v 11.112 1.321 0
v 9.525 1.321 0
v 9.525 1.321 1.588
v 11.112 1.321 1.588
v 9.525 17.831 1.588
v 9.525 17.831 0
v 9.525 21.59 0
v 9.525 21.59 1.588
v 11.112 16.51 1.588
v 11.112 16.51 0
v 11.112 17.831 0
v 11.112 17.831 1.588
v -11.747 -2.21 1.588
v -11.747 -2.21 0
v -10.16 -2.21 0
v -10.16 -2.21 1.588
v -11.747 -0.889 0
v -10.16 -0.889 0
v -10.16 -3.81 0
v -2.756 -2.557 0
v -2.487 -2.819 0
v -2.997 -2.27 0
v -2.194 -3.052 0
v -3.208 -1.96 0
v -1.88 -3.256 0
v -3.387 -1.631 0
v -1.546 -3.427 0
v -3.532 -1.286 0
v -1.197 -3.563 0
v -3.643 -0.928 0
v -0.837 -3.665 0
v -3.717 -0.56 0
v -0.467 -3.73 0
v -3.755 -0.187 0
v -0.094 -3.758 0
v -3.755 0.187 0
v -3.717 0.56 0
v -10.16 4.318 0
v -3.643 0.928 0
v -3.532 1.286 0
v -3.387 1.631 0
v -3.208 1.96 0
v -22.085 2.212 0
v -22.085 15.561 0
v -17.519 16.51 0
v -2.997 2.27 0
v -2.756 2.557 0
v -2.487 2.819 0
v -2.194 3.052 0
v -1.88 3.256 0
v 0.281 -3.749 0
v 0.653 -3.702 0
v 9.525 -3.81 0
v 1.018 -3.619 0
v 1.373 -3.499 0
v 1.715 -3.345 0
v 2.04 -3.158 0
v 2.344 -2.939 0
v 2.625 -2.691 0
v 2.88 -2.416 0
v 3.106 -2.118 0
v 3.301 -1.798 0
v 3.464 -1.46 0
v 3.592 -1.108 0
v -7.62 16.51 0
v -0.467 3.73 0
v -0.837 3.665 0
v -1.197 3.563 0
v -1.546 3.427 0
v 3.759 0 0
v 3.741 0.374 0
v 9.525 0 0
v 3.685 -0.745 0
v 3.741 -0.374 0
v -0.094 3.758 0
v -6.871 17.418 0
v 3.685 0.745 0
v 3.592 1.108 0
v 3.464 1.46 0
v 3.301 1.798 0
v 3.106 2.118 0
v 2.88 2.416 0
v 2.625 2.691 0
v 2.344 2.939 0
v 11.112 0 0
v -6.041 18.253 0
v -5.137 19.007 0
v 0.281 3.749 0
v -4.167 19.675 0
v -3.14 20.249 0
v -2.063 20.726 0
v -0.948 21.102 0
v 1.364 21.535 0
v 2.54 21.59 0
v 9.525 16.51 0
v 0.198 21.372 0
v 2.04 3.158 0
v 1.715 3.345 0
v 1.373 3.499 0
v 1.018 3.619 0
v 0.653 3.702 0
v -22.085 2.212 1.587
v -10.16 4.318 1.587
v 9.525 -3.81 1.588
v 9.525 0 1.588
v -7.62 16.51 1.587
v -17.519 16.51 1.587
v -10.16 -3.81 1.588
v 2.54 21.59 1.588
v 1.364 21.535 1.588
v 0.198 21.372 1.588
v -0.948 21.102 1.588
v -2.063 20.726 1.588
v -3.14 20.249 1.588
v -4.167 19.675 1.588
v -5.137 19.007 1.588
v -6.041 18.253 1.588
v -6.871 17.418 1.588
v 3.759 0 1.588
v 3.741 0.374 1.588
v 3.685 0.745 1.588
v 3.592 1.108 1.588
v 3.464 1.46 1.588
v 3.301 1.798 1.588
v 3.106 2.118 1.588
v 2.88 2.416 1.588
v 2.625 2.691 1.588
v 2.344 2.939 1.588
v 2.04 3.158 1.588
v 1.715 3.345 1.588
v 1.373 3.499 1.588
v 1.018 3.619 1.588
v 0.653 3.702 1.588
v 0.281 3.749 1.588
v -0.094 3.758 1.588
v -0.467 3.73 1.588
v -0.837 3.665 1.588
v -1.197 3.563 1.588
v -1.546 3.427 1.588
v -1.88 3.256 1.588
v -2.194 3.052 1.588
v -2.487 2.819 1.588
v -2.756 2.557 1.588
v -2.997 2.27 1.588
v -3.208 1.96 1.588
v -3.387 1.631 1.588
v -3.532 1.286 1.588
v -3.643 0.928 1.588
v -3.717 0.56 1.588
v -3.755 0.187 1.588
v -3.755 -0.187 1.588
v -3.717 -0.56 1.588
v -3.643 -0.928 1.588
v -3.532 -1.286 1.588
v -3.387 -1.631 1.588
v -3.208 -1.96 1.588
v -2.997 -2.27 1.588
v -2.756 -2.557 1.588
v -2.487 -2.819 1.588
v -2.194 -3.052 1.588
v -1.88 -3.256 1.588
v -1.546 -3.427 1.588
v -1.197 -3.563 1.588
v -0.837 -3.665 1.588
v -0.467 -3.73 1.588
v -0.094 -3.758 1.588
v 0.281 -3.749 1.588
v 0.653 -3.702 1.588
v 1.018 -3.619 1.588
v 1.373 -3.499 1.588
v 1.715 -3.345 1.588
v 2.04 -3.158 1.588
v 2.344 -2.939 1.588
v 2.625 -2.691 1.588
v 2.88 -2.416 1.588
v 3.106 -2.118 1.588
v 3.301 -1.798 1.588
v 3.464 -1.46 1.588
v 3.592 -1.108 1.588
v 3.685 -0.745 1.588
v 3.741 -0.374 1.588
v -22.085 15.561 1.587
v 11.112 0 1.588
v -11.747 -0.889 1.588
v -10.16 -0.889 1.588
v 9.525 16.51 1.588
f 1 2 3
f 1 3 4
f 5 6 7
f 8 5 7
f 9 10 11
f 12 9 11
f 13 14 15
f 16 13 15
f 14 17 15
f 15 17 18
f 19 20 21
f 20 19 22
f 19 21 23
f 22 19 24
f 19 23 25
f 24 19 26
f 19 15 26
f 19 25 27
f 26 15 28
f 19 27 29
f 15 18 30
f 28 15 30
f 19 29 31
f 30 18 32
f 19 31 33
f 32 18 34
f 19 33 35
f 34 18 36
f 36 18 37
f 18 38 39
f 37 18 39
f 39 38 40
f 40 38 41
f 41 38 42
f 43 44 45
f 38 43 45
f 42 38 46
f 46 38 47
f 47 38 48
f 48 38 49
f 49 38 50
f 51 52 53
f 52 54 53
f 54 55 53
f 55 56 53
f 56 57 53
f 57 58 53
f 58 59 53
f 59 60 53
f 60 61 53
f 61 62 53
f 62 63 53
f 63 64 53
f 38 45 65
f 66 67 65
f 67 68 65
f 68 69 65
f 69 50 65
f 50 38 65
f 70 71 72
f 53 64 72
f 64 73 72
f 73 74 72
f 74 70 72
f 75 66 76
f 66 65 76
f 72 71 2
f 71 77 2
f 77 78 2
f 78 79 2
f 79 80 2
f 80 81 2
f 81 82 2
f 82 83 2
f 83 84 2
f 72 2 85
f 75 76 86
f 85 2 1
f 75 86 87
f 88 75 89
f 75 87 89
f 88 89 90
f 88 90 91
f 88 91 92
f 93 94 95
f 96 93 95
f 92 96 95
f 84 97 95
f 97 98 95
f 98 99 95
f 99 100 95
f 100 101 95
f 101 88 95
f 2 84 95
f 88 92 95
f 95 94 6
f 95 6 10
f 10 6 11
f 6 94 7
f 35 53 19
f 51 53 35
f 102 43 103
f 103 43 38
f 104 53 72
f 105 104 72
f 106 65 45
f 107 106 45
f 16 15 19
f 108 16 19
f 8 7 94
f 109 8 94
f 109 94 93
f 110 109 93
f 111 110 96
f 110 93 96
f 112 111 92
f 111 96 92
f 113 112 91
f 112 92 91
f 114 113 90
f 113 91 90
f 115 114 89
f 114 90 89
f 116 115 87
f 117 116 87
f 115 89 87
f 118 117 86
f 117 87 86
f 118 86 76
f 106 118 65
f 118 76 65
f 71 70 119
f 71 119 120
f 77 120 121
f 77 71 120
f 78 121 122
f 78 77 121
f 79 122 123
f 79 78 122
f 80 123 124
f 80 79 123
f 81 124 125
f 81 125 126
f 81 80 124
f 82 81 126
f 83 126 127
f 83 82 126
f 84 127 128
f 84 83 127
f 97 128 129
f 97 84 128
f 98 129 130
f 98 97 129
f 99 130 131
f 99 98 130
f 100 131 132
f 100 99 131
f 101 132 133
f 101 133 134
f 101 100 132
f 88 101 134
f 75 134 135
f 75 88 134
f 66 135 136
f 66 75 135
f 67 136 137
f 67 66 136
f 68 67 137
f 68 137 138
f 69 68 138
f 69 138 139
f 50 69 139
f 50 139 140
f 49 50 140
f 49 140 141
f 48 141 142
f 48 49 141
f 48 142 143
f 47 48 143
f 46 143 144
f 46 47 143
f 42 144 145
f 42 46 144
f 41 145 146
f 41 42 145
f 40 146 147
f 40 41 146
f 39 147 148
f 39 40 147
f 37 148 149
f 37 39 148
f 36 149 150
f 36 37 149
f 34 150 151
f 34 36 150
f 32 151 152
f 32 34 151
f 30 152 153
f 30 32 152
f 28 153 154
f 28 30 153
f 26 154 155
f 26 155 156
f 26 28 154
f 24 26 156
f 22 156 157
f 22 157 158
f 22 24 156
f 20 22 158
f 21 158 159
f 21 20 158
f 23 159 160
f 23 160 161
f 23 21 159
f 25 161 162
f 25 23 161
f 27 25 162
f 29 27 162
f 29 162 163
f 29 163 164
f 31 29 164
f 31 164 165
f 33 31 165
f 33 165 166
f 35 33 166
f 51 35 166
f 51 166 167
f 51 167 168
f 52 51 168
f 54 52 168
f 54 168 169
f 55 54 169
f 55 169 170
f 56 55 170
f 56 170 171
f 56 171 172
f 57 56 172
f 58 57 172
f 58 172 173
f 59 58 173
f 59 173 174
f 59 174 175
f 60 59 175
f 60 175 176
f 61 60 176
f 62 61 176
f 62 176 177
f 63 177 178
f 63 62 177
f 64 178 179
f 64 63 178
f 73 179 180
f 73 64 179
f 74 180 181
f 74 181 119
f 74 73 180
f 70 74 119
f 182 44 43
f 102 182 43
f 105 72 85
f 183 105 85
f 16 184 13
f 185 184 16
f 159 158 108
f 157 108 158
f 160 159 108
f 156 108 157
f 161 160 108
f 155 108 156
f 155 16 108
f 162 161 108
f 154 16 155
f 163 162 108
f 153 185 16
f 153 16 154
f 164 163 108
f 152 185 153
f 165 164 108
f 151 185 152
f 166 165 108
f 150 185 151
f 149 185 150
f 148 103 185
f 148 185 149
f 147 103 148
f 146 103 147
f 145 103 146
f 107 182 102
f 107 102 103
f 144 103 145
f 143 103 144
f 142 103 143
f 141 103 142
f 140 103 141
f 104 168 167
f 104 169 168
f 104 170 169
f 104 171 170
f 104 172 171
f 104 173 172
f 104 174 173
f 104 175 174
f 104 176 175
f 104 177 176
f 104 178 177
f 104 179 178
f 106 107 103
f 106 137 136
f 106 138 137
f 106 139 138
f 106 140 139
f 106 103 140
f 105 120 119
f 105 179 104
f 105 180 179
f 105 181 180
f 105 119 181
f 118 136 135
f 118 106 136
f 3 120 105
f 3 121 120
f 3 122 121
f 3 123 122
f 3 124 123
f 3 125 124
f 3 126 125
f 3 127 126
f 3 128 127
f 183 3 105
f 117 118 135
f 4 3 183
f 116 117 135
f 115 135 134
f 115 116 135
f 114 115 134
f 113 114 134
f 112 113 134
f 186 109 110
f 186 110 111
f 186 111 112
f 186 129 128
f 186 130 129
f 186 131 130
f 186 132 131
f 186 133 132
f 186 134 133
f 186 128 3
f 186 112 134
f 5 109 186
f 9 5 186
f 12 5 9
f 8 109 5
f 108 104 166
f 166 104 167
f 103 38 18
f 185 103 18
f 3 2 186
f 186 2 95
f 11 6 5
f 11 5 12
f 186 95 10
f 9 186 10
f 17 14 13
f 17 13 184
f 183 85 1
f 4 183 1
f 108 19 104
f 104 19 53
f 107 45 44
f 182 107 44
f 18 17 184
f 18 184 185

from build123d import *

# Parameters (mm, degrees)
SKETCH1_R           = 3.7592
SKETCH1_W           = 1.5875
SKETCH1_H           = 1.3208
BOSS_EXTRUDE1_DEPTH = 1.5875


with BuildPart() as part:
    # Sketch1 → Boss-Extrude1 (new body)
    # profile 1 of 6: a face of its own
    with BuildSketch(Plane.XY):
        with BuildLine():
            ThreePointArc((2.54, 21.59), (-3.139612663, 20.249225326), (-7.62, 16.51))
            ThreePointArc((-7.62, 16.51), (-9.508277885, 12.906092628), (-10.16, 8.89))
            Line((-10.16, 8.89), (-10.16, 4.318))
            Line((-10.16, 4.318), (-10.16, -0.889))
            Line((-10.16, -0.889), (-10.16, -2.2098))
            Line((-10.16, -2.2098), (-10.16, -3.81))
            Line((-10.16, -3.81), (9.525, -3.81))
            Line((9.525, -3.81), (9.525, 0))
            Line((9.525, 0), (9.525, 1.3208))
            Line((9.525, 1.3208), (9.525, 16.51))
            Line((9.525, 16.51), (9.525, 17.8308))
            Line((9.525, 17.8308), (9.525, 21.59))
            Line((9.525, 21.59), (2.54, 21.59))
        make_face()
        Circle(SKETCH1_R, mode=Mode.SUBTRACT)
    # profile 2 of 6: a face of its own
    with BuildSketch(Plane.XY):
        with Locations((-10.95375, -1.5494)):
            Rectangle(SKETCH1_W, SKETCH1_H)
    # profile 3 of 6: a face of its own
    with BuildSketch(Plane.XY):
        with Locations((10.31875, 17.1704)):
            Rectangle(SKETCH1_W, SKETCH1_H)
    # profile 4 of 6: a face of its own
    with BuildSketch(Plane.XY):
        with Locations((10.31875, 0.6604)):
            Rectangle(SKETCH1_W, SKETCH1_H)
    # profile 5 of 6: a face of its own
    with BuildSketch(Plane.XY):
        with BuildLine():
            ThreePointArc((-10.16, 8.89), (-9.508277885, 12.906092628), (-7.62, 16.51))
            Line((-7.62, 16.51), (-17.51946076, 16.51))
            Line((-17.51946076, 16.51), (-22.084921519, 15.561162564))
            Line((-22.084921519, 15.561162564), (-22.084921519, 13.081))
            Line((-22.084921519, 13.081), (-22.084921519, 4.699))
            Line((-22.084921519, 4.699), (-22.084921519, 2.212007412))
            Line((-22.084921519, 2.212007412), (-10.16, 4.318))
            Line((-10.16, 4.318), (-10.16, 8.89))
        make_face()
    # profile 6 of 6: a face of its own
    with BuildSketch(Plane.XY):
        with BuildLine():
            ThreePointArc((-10.16, 8.89), (-9.508277885, 12.906092628), (-7.62, 16.51))
            Line((-7.62, 16.51), (-17.51946076, 16.51))
            Line((-17.51946076, 16.51), (-22.084921519, 15.561162564))
            Line((-22.084921519, 15.561162564), (-22.084921519, 13.081))
            Line((-22.084921519, 13.081), (-22.084921519, 4.699))
            Line((-22.084921519, 4.699), (-22.084921519, 2.212007412))
            Line((-22.084921519, 2.212007412), (-10.16, 4.318))
            Line((-10.16, 4.318), (-10.16, 8.89))
        make_face()
    extrude(amount=BOSS_EXTRUDE1_DEPTH)


solid = part.part
